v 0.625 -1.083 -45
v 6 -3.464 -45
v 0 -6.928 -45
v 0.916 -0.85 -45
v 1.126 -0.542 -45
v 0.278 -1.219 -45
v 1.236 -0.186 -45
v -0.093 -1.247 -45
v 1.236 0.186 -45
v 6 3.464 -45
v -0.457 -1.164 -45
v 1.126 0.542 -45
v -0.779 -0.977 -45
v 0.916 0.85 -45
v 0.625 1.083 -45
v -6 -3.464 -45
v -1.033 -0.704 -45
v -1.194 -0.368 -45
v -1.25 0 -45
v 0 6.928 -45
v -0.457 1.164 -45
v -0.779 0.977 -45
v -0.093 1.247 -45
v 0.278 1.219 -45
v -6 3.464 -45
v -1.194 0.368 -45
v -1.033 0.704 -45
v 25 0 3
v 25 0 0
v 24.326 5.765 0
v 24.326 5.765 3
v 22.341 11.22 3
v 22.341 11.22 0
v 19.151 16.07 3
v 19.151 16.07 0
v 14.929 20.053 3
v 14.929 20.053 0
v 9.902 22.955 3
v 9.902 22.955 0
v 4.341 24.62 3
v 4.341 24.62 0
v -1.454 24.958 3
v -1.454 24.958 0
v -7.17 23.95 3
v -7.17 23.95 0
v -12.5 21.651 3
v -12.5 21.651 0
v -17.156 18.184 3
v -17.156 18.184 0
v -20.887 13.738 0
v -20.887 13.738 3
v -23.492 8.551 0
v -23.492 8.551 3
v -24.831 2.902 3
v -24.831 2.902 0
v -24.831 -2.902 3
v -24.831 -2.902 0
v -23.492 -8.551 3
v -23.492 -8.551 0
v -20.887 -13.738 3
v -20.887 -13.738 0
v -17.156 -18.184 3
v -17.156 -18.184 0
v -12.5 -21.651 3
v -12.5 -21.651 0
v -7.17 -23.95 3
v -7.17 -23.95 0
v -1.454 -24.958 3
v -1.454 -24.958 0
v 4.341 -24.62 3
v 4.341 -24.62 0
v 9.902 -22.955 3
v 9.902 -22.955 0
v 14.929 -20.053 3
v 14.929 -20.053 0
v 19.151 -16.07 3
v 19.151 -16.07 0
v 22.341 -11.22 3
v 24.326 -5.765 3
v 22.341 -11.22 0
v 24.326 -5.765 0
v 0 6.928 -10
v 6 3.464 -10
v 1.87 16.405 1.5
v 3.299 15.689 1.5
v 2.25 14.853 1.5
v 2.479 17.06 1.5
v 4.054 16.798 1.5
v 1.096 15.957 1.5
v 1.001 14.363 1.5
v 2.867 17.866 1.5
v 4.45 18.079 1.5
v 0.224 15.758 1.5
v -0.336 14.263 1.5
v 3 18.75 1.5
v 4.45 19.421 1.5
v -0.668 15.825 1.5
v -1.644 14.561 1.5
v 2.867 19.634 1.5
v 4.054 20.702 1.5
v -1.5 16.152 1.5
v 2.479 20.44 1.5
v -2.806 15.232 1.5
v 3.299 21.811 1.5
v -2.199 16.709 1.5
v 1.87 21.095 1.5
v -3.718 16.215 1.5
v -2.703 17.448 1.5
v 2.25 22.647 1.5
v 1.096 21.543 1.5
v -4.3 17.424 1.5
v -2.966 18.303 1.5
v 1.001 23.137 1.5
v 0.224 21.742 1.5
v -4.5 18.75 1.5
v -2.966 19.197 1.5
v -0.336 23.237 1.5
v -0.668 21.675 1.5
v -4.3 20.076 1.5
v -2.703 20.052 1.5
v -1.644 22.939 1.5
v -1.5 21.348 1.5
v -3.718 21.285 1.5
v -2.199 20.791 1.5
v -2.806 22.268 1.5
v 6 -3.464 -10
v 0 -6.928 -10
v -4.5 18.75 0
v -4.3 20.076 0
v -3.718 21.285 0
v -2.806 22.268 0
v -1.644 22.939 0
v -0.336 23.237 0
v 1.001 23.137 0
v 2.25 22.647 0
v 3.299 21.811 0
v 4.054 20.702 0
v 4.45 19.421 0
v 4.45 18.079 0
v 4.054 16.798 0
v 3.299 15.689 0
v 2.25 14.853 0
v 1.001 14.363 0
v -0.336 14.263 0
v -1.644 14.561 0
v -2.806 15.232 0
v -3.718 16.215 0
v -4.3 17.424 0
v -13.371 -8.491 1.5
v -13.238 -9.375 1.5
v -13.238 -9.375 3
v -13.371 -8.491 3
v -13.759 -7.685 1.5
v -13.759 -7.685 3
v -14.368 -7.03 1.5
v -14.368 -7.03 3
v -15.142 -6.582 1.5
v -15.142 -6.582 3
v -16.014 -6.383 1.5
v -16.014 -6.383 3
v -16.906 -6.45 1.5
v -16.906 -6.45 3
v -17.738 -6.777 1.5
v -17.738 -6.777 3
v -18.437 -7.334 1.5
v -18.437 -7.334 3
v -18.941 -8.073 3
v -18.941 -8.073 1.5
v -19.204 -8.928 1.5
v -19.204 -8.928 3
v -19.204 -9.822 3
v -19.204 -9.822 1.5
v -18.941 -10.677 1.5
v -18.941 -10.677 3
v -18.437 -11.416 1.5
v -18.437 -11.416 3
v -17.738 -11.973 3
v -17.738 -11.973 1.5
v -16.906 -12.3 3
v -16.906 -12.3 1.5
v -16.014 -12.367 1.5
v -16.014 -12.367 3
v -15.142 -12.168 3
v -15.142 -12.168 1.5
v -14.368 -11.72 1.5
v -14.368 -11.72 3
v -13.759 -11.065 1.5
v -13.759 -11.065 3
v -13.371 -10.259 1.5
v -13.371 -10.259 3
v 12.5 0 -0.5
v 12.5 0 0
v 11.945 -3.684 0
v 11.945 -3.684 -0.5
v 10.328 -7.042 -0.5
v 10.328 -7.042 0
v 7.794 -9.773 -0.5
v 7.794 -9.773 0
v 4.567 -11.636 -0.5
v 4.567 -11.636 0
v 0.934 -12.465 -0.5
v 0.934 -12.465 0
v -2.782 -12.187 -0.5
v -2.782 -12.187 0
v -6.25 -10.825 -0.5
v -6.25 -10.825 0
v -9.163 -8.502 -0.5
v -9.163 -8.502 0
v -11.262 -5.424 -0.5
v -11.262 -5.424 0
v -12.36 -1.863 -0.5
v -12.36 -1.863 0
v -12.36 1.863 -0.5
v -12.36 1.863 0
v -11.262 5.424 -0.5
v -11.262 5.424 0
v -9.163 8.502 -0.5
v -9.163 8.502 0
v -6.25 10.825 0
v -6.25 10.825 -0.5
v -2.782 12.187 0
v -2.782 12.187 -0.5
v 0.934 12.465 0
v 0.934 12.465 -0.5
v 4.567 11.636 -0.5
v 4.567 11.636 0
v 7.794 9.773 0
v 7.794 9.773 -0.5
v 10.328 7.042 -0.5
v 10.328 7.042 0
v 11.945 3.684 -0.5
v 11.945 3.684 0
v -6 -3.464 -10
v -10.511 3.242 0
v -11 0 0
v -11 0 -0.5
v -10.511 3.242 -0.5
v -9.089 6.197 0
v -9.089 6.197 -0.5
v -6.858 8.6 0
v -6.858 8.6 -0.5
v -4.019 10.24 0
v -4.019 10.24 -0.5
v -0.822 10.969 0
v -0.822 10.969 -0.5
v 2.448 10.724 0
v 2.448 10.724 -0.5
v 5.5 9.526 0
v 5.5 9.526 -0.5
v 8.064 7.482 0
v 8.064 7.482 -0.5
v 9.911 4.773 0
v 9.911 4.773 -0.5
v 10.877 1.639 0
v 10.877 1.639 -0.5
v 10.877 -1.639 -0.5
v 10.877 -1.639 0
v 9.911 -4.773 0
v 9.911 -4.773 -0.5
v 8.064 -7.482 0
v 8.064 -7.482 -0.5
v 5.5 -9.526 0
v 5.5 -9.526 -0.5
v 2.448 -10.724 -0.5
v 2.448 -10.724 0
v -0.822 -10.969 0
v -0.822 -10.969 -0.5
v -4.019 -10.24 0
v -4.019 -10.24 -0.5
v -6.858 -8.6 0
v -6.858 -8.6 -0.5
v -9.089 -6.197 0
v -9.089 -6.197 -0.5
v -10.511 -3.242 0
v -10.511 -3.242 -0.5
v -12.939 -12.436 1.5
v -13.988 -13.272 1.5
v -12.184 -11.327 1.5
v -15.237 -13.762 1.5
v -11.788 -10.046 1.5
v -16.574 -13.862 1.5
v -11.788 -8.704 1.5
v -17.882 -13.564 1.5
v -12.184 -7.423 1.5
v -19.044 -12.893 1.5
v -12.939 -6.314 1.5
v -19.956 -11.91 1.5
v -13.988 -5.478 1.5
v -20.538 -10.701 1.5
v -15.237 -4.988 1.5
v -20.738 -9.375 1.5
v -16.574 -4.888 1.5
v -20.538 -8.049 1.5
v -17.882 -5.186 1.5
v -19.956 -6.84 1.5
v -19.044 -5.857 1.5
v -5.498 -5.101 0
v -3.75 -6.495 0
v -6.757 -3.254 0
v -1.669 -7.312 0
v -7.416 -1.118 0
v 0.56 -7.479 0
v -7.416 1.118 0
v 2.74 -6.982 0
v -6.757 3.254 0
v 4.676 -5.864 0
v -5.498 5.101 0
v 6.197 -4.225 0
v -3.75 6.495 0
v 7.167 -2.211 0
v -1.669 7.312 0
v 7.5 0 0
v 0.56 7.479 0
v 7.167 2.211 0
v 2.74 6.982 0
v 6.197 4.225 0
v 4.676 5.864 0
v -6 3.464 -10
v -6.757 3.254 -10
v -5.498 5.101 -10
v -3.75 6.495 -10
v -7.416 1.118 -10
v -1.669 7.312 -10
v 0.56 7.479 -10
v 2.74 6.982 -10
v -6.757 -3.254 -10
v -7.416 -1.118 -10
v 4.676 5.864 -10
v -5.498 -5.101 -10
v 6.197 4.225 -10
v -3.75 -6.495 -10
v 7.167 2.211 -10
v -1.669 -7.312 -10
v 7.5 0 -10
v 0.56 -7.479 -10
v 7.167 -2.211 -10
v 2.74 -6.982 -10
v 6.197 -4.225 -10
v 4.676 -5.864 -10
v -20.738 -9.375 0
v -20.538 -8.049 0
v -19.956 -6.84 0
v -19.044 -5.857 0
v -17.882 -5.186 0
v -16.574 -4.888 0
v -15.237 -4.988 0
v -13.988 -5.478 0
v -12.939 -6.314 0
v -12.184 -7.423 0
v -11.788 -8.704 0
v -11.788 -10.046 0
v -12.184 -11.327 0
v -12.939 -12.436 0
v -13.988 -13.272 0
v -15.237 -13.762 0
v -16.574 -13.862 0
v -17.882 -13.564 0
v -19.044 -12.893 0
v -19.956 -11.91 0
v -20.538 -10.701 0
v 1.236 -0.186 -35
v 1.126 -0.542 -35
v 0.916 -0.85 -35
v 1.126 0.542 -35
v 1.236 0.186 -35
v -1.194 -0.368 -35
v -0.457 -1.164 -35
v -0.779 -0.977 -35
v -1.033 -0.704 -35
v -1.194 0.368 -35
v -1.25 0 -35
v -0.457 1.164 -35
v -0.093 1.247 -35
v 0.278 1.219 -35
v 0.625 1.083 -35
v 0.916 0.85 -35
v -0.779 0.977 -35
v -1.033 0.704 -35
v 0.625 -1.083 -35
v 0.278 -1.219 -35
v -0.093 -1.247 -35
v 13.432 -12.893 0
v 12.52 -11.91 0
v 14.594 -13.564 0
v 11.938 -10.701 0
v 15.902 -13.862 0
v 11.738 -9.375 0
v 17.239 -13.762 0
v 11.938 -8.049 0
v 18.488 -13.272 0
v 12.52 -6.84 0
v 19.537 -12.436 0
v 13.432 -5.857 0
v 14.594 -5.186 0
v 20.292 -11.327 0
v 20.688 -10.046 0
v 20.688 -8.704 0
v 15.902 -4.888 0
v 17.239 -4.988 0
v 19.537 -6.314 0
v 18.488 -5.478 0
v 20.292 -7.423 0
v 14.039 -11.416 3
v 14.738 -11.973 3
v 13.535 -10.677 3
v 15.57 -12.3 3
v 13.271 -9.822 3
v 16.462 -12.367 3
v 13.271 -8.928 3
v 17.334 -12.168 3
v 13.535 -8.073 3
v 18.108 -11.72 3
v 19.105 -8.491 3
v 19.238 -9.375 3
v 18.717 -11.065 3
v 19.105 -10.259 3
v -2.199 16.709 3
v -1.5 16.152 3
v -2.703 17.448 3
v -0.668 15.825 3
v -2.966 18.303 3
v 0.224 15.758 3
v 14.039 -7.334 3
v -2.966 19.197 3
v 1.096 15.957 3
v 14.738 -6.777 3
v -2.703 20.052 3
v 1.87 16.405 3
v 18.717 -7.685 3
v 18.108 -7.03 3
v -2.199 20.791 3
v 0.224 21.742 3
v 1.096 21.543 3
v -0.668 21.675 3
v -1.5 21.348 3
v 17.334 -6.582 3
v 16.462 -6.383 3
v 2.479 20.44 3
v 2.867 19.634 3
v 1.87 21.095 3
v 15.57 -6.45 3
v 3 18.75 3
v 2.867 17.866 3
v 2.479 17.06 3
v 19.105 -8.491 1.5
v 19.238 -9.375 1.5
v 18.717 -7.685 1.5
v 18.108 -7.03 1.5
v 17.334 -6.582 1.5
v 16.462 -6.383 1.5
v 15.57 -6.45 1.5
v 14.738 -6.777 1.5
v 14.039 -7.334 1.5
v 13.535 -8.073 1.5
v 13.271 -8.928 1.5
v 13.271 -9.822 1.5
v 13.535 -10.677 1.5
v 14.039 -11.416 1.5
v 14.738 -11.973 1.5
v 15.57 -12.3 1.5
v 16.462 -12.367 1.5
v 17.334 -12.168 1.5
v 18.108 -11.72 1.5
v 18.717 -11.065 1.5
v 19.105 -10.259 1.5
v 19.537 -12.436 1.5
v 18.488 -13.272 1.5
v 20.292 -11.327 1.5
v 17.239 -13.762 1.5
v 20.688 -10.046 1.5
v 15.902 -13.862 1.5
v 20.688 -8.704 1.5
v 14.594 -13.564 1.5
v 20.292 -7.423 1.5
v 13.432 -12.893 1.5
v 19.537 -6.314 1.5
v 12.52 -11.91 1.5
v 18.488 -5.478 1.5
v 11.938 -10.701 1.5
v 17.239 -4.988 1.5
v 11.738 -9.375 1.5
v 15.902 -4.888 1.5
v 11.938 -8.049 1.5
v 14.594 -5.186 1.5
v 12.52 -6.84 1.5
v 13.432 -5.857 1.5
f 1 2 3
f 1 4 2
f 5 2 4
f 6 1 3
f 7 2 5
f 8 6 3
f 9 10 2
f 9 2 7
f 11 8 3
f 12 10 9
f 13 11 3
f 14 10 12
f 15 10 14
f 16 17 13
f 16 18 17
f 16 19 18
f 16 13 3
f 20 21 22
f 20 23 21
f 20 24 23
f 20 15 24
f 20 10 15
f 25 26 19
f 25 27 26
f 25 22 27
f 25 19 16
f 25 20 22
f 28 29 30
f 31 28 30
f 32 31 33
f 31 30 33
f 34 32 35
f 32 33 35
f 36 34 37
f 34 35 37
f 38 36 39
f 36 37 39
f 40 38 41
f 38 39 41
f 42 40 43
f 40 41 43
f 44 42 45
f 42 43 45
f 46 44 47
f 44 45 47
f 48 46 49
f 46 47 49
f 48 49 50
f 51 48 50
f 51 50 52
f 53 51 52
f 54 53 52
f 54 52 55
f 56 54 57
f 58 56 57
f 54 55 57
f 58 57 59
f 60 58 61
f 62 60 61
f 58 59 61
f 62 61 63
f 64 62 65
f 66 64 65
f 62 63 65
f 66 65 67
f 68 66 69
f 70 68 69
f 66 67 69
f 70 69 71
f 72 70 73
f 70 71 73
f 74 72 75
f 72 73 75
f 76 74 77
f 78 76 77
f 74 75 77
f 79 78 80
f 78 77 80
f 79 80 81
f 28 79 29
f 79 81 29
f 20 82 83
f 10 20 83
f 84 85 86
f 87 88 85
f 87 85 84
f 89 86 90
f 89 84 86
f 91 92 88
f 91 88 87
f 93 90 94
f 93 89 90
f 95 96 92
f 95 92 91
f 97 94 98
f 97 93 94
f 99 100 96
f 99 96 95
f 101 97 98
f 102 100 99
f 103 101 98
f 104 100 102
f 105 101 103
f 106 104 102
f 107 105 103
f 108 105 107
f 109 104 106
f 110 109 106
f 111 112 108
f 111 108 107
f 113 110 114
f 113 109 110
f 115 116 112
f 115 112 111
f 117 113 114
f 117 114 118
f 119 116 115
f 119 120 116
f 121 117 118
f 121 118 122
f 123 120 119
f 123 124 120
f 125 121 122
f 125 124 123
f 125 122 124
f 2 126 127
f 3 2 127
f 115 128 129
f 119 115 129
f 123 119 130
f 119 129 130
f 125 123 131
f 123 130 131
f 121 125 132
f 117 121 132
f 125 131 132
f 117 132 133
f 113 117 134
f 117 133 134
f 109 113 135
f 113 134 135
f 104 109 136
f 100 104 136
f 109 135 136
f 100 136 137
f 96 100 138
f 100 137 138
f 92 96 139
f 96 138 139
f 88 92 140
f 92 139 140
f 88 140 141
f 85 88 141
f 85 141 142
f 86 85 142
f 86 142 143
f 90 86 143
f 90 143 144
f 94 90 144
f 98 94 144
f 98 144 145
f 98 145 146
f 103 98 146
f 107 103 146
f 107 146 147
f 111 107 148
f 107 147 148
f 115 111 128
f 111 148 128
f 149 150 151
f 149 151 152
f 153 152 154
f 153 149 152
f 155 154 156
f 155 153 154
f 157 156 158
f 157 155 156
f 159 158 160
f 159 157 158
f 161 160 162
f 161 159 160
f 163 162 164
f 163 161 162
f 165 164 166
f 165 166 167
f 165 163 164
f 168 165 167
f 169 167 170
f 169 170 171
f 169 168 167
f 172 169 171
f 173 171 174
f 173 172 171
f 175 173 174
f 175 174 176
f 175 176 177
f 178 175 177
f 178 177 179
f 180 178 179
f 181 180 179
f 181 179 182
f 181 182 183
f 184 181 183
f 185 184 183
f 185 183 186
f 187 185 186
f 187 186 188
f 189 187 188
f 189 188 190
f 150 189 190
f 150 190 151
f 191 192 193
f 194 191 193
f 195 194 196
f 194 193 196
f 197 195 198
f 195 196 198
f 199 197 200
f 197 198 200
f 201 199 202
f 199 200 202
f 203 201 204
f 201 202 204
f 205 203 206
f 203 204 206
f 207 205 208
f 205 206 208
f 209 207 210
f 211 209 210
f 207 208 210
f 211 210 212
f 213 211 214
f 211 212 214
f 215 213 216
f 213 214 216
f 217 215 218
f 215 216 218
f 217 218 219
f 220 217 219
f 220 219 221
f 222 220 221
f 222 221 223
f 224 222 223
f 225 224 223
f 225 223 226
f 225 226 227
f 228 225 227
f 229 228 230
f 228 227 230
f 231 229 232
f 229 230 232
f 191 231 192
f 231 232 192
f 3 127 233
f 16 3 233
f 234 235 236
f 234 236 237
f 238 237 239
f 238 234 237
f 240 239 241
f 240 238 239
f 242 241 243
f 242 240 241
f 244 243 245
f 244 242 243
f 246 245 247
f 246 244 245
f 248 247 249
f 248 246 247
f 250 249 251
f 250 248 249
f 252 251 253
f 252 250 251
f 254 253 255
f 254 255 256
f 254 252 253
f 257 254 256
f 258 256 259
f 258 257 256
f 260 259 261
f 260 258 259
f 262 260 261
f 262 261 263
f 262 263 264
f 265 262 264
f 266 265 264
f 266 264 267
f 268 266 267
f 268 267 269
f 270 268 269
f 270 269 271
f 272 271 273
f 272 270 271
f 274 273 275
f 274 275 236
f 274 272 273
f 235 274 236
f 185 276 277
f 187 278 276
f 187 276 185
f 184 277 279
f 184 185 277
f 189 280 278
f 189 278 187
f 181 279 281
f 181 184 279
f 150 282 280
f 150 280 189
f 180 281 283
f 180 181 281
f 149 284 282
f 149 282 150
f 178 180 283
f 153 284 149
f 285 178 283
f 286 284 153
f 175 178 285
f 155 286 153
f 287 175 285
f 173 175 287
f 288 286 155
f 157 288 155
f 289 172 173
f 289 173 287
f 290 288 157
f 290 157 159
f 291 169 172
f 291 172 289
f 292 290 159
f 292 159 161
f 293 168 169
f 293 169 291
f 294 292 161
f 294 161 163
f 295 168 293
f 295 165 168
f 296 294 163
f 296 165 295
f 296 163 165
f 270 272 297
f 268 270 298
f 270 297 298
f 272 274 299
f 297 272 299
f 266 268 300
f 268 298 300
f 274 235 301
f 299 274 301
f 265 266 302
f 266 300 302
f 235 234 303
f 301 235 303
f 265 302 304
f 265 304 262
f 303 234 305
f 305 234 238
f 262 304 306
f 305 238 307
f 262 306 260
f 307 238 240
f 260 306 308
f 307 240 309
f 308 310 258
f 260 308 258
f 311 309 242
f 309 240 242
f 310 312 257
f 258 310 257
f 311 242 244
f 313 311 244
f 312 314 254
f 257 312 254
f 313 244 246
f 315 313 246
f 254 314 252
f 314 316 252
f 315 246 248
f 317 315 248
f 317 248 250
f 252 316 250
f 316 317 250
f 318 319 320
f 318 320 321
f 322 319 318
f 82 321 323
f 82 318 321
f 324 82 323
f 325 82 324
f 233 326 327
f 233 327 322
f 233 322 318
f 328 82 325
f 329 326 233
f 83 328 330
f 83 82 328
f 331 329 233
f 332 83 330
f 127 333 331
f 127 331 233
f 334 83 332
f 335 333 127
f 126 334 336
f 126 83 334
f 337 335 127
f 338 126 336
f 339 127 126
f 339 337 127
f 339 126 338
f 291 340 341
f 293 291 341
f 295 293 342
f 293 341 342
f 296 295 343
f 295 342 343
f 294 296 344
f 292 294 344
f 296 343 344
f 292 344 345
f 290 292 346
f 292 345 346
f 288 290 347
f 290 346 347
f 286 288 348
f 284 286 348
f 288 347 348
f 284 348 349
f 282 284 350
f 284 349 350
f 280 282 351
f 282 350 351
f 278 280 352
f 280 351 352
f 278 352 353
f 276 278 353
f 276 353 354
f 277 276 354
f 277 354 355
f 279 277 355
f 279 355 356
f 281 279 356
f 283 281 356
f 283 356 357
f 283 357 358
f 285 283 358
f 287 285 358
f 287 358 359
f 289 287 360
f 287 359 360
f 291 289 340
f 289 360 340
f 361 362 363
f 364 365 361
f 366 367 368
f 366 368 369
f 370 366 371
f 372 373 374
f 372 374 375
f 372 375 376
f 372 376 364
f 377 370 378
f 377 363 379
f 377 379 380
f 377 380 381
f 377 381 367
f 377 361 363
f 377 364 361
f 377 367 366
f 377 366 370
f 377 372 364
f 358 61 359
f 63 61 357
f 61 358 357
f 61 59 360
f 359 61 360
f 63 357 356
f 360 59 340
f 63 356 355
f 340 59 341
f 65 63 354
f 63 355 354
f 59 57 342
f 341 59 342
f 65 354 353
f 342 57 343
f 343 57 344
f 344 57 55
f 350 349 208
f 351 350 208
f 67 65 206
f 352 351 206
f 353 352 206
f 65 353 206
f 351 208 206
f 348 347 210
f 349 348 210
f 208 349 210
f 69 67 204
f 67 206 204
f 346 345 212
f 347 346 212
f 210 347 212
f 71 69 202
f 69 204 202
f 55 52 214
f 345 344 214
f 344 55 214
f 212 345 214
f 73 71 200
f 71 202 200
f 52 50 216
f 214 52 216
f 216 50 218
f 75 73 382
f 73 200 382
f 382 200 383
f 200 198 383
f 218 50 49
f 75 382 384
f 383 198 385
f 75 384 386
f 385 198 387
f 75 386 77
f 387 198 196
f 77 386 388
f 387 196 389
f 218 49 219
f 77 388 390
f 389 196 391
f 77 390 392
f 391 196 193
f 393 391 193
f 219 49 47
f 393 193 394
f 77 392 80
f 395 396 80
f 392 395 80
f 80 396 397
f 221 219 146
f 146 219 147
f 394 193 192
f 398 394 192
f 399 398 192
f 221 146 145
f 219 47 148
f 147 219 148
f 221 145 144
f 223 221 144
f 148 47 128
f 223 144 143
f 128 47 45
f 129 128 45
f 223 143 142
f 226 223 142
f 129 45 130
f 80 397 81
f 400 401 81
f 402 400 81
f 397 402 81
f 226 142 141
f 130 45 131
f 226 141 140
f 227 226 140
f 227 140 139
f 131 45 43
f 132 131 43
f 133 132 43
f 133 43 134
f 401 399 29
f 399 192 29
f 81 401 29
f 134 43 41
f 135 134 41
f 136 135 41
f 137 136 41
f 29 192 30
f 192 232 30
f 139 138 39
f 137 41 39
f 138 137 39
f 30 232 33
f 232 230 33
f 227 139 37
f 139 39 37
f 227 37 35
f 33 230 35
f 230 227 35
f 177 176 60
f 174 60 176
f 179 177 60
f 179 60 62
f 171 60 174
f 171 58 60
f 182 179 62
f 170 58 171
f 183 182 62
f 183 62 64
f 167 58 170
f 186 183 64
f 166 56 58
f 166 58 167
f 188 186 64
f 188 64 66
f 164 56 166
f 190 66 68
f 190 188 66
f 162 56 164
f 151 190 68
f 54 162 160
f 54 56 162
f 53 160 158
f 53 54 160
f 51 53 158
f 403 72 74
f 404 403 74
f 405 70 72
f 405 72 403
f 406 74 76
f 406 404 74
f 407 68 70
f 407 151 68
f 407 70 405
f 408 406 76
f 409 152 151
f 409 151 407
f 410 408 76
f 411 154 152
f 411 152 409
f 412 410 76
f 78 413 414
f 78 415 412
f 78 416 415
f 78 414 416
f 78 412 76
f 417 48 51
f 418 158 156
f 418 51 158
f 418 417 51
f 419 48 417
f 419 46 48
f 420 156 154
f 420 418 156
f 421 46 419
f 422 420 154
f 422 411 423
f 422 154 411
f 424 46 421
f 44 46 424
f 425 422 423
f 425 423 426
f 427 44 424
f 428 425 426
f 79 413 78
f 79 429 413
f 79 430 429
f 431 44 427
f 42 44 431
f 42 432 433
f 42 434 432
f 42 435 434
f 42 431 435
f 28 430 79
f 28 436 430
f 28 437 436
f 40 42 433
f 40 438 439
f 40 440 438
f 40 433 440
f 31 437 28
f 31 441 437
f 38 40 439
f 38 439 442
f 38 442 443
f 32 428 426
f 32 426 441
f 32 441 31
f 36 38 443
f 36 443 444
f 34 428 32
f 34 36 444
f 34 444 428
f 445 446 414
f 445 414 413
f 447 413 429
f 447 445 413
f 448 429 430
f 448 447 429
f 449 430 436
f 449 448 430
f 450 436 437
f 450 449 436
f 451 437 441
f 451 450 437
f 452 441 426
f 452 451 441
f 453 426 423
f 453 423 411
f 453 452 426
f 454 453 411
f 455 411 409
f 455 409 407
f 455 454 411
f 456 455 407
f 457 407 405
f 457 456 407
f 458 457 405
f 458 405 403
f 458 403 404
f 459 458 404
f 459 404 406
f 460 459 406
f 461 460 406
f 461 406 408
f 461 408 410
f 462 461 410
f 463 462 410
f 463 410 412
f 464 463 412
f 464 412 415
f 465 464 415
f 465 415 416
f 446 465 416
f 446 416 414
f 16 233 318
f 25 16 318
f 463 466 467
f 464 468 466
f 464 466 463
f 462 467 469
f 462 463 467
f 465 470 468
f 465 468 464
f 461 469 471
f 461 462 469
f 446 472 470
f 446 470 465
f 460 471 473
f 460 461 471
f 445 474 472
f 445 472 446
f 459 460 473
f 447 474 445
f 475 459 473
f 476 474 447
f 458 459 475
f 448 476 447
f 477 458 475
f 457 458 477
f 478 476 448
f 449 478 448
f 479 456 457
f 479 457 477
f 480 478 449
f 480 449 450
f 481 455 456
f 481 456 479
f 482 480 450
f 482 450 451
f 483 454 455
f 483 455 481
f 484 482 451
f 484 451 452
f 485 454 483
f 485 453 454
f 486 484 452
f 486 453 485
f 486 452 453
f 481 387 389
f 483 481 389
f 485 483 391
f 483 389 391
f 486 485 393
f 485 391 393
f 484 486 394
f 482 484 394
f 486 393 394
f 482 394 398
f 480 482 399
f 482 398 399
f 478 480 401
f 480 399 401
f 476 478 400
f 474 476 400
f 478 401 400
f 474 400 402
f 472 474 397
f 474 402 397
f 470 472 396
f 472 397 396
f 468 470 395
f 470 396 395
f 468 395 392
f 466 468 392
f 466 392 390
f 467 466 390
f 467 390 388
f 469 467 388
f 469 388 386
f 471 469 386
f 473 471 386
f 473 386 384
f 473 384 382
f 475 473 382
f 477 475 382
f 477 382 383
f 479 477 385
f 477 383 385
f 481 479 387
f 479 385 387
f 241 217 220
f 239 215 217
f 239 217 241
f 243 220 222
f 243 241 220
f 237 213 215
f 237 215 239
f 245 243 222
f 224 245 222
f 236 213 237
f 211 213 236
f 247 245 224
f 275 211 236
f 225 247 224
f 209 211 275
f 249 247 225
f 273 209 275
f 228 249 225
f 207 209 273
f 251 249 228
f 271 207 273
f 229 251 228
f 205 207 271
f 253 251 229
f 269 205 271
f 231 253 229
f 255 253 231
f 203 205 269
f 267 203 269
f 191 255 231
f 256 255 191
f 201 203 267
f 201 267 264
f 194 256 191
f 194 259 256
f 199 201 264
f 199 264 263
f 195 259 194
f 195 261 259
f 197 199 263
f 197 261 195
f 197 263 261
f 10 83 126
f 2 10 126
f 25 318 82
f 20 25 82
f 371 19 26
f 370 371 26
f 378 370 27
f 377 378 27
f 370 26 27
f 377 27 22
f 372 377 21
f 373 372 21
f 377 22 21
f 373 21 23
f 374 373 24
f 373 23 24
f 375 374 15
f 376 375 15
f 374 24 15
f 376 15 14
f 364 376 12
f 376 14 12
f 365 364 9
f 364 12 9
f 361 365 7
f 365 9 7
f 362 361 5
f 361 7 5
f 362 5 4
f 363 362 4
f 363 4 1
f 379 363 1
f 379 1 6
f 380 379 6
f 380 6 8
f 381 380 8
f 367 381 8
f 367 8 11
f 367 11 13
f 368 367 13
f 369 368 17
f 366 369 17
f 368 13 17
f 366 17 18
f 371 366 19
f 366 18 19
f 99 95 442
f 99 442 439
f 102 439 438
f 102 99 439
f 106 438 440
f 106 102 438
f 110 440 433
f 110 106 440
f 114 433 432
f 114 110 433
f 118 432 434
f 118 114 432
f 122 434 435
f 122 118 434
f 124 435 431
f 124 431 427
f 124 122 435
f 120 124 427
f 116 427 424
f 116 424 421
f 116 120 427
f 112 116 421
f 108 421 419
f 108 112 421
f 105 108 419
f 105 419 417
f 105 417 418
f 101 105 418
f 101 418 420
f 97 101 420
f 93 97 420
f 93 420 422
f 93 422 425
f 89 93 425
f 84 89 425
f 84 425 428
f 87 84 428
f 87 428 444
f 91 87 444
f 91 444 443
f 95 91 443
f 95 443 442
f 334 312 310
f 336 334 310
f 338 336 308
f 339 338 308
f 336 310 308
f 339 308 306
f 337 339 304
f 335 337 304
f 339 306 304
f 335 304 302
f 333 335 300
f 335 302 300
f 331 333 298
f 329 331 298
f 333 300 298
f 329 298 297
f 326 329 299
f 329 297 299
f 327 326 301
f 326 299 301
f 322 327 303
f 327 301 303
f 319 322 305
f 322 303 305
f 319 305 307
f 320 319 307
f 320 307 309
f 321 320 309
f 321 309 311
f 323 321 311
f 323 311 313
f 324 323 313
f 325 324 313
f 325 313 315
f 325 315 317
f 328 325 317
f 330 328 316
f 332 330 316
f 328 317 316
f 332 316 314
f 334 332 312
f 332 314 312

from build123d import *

# Parameters (mm, degrees)
SKETCH1_R           = 25
SKETCH1_R_2         = 3
BOSS_EXTRUDE1_DEPTH = 3
SKETCH2_R           = 7.5
BOSS_EXTRUDE2_DEPTH = 10
BOSS_EXTRUDE3_DEPTH = 35
SKETCH4_R           = 1.25
CUT_EXTRUDE1_DEPTH  = 10
SKETCH5_R           = 12.5
SKETCH5_R_2         = 11
BOSS_EXTRUDE4_DEPTH = 0.5
SKETCH6_R           = 4.5
CUT_EXTRUDE2_DEPTH  = 1.5


with BuildPart() as part:
    # Sketch1 → Boss-Extrude1 (new body)
    with BuildSketch(Plane.XY):
        Circle(SKETCH1_R)
        with Locations((0, 18.75)):
            Circle(SKETCH1_R_2, mode=Mode.SUBTRACT)
        with Locations((16.237976321, -9.375)):
            Circle(SKETCH1_R_2, mode=Mode.SUBTRACT)
        with Locations((-16.237976321, -9.375)):
            Circle(SKETCH1_R_2, mode=Mode.SUBTRACT)
    extrude(amount=BOSS_EXTRUDE1_DEPTH)

    # Sketch2 → Boss-Extrude2 (add)
    with BuildSketch(Plane(origin=(0, 0, 0), x_dir=(-1, 0, 0), z_dir=(0, 0, -1))):
        with Locations(Location((0, 0, 0), (0, 0, 180))):
            Circle(SKETCH2_R)
    extrude(amount=BOSS_EXTRUDE2_DEPTH)

    # Sketch3 → Boss-Extrude3 (add)
    with BuildSketch(Plane(origin=(0, 0, -10), x_dir=(-1, 0, 0), z_dir=(0, 0, -1))):
        Polygon((0, -6.92820323), (6, -3.464101615), (6, 3.464101615), (0, 6.92820323), (-6, 3.464101615), (-6, -3.464101615), align=None)
    extrude(amount=BOSS_EXTRUDE3_DEPTH)

    # Sketch4 → Cut-Extrude1 (cut)
    with BuildSketch(Plane(origin=(0, 0, -45), x_dir=(-1, 0, 0), z_dir=(0, 0, -1))):
        Circle(SKETCH4_R)
    extrude(amount=-CUT_EXTRUDE1_DEPTH, mode=Mode.SUBTRACT)

    # Sketch5 → Boss-Extrude4 (add)
    with BuildSketch(Plane(origin=(0, 0, 0), x_dir=(-1, 0, 0), z_dir=(0, 0, -1))):
        with Locations(Location((0, 0, 0), (0, 0, 180))):
            Circle(SKETCH5_R)
        Circle(SKETCH5_R_2, mode=Mode.SUBTRACT)
    extrude(amount=BOSS_EXTRUDE4_DEPTH)

    # Sketch6 → Cut-Extrude2 (cut)
    with BuildSketch(Plane(origin=(0, 0, 0), x_dir=(-1, 0, 0), z_dir=(0, 0, -1))):
        with Locations((0, 18.75)):
            Circle(SKETCH6_R)
        with Locations((16.237976321, -9.375)):
            Circle(SKETCH6_R)
        with Locations((-16.237976321, -9.375)):
            Circle(SKETCH6_R)
    extrude(amount=-CUT_EXTRUDE2_DEPTH, mode=Mode.SUBTRACT)


solid = part.part
